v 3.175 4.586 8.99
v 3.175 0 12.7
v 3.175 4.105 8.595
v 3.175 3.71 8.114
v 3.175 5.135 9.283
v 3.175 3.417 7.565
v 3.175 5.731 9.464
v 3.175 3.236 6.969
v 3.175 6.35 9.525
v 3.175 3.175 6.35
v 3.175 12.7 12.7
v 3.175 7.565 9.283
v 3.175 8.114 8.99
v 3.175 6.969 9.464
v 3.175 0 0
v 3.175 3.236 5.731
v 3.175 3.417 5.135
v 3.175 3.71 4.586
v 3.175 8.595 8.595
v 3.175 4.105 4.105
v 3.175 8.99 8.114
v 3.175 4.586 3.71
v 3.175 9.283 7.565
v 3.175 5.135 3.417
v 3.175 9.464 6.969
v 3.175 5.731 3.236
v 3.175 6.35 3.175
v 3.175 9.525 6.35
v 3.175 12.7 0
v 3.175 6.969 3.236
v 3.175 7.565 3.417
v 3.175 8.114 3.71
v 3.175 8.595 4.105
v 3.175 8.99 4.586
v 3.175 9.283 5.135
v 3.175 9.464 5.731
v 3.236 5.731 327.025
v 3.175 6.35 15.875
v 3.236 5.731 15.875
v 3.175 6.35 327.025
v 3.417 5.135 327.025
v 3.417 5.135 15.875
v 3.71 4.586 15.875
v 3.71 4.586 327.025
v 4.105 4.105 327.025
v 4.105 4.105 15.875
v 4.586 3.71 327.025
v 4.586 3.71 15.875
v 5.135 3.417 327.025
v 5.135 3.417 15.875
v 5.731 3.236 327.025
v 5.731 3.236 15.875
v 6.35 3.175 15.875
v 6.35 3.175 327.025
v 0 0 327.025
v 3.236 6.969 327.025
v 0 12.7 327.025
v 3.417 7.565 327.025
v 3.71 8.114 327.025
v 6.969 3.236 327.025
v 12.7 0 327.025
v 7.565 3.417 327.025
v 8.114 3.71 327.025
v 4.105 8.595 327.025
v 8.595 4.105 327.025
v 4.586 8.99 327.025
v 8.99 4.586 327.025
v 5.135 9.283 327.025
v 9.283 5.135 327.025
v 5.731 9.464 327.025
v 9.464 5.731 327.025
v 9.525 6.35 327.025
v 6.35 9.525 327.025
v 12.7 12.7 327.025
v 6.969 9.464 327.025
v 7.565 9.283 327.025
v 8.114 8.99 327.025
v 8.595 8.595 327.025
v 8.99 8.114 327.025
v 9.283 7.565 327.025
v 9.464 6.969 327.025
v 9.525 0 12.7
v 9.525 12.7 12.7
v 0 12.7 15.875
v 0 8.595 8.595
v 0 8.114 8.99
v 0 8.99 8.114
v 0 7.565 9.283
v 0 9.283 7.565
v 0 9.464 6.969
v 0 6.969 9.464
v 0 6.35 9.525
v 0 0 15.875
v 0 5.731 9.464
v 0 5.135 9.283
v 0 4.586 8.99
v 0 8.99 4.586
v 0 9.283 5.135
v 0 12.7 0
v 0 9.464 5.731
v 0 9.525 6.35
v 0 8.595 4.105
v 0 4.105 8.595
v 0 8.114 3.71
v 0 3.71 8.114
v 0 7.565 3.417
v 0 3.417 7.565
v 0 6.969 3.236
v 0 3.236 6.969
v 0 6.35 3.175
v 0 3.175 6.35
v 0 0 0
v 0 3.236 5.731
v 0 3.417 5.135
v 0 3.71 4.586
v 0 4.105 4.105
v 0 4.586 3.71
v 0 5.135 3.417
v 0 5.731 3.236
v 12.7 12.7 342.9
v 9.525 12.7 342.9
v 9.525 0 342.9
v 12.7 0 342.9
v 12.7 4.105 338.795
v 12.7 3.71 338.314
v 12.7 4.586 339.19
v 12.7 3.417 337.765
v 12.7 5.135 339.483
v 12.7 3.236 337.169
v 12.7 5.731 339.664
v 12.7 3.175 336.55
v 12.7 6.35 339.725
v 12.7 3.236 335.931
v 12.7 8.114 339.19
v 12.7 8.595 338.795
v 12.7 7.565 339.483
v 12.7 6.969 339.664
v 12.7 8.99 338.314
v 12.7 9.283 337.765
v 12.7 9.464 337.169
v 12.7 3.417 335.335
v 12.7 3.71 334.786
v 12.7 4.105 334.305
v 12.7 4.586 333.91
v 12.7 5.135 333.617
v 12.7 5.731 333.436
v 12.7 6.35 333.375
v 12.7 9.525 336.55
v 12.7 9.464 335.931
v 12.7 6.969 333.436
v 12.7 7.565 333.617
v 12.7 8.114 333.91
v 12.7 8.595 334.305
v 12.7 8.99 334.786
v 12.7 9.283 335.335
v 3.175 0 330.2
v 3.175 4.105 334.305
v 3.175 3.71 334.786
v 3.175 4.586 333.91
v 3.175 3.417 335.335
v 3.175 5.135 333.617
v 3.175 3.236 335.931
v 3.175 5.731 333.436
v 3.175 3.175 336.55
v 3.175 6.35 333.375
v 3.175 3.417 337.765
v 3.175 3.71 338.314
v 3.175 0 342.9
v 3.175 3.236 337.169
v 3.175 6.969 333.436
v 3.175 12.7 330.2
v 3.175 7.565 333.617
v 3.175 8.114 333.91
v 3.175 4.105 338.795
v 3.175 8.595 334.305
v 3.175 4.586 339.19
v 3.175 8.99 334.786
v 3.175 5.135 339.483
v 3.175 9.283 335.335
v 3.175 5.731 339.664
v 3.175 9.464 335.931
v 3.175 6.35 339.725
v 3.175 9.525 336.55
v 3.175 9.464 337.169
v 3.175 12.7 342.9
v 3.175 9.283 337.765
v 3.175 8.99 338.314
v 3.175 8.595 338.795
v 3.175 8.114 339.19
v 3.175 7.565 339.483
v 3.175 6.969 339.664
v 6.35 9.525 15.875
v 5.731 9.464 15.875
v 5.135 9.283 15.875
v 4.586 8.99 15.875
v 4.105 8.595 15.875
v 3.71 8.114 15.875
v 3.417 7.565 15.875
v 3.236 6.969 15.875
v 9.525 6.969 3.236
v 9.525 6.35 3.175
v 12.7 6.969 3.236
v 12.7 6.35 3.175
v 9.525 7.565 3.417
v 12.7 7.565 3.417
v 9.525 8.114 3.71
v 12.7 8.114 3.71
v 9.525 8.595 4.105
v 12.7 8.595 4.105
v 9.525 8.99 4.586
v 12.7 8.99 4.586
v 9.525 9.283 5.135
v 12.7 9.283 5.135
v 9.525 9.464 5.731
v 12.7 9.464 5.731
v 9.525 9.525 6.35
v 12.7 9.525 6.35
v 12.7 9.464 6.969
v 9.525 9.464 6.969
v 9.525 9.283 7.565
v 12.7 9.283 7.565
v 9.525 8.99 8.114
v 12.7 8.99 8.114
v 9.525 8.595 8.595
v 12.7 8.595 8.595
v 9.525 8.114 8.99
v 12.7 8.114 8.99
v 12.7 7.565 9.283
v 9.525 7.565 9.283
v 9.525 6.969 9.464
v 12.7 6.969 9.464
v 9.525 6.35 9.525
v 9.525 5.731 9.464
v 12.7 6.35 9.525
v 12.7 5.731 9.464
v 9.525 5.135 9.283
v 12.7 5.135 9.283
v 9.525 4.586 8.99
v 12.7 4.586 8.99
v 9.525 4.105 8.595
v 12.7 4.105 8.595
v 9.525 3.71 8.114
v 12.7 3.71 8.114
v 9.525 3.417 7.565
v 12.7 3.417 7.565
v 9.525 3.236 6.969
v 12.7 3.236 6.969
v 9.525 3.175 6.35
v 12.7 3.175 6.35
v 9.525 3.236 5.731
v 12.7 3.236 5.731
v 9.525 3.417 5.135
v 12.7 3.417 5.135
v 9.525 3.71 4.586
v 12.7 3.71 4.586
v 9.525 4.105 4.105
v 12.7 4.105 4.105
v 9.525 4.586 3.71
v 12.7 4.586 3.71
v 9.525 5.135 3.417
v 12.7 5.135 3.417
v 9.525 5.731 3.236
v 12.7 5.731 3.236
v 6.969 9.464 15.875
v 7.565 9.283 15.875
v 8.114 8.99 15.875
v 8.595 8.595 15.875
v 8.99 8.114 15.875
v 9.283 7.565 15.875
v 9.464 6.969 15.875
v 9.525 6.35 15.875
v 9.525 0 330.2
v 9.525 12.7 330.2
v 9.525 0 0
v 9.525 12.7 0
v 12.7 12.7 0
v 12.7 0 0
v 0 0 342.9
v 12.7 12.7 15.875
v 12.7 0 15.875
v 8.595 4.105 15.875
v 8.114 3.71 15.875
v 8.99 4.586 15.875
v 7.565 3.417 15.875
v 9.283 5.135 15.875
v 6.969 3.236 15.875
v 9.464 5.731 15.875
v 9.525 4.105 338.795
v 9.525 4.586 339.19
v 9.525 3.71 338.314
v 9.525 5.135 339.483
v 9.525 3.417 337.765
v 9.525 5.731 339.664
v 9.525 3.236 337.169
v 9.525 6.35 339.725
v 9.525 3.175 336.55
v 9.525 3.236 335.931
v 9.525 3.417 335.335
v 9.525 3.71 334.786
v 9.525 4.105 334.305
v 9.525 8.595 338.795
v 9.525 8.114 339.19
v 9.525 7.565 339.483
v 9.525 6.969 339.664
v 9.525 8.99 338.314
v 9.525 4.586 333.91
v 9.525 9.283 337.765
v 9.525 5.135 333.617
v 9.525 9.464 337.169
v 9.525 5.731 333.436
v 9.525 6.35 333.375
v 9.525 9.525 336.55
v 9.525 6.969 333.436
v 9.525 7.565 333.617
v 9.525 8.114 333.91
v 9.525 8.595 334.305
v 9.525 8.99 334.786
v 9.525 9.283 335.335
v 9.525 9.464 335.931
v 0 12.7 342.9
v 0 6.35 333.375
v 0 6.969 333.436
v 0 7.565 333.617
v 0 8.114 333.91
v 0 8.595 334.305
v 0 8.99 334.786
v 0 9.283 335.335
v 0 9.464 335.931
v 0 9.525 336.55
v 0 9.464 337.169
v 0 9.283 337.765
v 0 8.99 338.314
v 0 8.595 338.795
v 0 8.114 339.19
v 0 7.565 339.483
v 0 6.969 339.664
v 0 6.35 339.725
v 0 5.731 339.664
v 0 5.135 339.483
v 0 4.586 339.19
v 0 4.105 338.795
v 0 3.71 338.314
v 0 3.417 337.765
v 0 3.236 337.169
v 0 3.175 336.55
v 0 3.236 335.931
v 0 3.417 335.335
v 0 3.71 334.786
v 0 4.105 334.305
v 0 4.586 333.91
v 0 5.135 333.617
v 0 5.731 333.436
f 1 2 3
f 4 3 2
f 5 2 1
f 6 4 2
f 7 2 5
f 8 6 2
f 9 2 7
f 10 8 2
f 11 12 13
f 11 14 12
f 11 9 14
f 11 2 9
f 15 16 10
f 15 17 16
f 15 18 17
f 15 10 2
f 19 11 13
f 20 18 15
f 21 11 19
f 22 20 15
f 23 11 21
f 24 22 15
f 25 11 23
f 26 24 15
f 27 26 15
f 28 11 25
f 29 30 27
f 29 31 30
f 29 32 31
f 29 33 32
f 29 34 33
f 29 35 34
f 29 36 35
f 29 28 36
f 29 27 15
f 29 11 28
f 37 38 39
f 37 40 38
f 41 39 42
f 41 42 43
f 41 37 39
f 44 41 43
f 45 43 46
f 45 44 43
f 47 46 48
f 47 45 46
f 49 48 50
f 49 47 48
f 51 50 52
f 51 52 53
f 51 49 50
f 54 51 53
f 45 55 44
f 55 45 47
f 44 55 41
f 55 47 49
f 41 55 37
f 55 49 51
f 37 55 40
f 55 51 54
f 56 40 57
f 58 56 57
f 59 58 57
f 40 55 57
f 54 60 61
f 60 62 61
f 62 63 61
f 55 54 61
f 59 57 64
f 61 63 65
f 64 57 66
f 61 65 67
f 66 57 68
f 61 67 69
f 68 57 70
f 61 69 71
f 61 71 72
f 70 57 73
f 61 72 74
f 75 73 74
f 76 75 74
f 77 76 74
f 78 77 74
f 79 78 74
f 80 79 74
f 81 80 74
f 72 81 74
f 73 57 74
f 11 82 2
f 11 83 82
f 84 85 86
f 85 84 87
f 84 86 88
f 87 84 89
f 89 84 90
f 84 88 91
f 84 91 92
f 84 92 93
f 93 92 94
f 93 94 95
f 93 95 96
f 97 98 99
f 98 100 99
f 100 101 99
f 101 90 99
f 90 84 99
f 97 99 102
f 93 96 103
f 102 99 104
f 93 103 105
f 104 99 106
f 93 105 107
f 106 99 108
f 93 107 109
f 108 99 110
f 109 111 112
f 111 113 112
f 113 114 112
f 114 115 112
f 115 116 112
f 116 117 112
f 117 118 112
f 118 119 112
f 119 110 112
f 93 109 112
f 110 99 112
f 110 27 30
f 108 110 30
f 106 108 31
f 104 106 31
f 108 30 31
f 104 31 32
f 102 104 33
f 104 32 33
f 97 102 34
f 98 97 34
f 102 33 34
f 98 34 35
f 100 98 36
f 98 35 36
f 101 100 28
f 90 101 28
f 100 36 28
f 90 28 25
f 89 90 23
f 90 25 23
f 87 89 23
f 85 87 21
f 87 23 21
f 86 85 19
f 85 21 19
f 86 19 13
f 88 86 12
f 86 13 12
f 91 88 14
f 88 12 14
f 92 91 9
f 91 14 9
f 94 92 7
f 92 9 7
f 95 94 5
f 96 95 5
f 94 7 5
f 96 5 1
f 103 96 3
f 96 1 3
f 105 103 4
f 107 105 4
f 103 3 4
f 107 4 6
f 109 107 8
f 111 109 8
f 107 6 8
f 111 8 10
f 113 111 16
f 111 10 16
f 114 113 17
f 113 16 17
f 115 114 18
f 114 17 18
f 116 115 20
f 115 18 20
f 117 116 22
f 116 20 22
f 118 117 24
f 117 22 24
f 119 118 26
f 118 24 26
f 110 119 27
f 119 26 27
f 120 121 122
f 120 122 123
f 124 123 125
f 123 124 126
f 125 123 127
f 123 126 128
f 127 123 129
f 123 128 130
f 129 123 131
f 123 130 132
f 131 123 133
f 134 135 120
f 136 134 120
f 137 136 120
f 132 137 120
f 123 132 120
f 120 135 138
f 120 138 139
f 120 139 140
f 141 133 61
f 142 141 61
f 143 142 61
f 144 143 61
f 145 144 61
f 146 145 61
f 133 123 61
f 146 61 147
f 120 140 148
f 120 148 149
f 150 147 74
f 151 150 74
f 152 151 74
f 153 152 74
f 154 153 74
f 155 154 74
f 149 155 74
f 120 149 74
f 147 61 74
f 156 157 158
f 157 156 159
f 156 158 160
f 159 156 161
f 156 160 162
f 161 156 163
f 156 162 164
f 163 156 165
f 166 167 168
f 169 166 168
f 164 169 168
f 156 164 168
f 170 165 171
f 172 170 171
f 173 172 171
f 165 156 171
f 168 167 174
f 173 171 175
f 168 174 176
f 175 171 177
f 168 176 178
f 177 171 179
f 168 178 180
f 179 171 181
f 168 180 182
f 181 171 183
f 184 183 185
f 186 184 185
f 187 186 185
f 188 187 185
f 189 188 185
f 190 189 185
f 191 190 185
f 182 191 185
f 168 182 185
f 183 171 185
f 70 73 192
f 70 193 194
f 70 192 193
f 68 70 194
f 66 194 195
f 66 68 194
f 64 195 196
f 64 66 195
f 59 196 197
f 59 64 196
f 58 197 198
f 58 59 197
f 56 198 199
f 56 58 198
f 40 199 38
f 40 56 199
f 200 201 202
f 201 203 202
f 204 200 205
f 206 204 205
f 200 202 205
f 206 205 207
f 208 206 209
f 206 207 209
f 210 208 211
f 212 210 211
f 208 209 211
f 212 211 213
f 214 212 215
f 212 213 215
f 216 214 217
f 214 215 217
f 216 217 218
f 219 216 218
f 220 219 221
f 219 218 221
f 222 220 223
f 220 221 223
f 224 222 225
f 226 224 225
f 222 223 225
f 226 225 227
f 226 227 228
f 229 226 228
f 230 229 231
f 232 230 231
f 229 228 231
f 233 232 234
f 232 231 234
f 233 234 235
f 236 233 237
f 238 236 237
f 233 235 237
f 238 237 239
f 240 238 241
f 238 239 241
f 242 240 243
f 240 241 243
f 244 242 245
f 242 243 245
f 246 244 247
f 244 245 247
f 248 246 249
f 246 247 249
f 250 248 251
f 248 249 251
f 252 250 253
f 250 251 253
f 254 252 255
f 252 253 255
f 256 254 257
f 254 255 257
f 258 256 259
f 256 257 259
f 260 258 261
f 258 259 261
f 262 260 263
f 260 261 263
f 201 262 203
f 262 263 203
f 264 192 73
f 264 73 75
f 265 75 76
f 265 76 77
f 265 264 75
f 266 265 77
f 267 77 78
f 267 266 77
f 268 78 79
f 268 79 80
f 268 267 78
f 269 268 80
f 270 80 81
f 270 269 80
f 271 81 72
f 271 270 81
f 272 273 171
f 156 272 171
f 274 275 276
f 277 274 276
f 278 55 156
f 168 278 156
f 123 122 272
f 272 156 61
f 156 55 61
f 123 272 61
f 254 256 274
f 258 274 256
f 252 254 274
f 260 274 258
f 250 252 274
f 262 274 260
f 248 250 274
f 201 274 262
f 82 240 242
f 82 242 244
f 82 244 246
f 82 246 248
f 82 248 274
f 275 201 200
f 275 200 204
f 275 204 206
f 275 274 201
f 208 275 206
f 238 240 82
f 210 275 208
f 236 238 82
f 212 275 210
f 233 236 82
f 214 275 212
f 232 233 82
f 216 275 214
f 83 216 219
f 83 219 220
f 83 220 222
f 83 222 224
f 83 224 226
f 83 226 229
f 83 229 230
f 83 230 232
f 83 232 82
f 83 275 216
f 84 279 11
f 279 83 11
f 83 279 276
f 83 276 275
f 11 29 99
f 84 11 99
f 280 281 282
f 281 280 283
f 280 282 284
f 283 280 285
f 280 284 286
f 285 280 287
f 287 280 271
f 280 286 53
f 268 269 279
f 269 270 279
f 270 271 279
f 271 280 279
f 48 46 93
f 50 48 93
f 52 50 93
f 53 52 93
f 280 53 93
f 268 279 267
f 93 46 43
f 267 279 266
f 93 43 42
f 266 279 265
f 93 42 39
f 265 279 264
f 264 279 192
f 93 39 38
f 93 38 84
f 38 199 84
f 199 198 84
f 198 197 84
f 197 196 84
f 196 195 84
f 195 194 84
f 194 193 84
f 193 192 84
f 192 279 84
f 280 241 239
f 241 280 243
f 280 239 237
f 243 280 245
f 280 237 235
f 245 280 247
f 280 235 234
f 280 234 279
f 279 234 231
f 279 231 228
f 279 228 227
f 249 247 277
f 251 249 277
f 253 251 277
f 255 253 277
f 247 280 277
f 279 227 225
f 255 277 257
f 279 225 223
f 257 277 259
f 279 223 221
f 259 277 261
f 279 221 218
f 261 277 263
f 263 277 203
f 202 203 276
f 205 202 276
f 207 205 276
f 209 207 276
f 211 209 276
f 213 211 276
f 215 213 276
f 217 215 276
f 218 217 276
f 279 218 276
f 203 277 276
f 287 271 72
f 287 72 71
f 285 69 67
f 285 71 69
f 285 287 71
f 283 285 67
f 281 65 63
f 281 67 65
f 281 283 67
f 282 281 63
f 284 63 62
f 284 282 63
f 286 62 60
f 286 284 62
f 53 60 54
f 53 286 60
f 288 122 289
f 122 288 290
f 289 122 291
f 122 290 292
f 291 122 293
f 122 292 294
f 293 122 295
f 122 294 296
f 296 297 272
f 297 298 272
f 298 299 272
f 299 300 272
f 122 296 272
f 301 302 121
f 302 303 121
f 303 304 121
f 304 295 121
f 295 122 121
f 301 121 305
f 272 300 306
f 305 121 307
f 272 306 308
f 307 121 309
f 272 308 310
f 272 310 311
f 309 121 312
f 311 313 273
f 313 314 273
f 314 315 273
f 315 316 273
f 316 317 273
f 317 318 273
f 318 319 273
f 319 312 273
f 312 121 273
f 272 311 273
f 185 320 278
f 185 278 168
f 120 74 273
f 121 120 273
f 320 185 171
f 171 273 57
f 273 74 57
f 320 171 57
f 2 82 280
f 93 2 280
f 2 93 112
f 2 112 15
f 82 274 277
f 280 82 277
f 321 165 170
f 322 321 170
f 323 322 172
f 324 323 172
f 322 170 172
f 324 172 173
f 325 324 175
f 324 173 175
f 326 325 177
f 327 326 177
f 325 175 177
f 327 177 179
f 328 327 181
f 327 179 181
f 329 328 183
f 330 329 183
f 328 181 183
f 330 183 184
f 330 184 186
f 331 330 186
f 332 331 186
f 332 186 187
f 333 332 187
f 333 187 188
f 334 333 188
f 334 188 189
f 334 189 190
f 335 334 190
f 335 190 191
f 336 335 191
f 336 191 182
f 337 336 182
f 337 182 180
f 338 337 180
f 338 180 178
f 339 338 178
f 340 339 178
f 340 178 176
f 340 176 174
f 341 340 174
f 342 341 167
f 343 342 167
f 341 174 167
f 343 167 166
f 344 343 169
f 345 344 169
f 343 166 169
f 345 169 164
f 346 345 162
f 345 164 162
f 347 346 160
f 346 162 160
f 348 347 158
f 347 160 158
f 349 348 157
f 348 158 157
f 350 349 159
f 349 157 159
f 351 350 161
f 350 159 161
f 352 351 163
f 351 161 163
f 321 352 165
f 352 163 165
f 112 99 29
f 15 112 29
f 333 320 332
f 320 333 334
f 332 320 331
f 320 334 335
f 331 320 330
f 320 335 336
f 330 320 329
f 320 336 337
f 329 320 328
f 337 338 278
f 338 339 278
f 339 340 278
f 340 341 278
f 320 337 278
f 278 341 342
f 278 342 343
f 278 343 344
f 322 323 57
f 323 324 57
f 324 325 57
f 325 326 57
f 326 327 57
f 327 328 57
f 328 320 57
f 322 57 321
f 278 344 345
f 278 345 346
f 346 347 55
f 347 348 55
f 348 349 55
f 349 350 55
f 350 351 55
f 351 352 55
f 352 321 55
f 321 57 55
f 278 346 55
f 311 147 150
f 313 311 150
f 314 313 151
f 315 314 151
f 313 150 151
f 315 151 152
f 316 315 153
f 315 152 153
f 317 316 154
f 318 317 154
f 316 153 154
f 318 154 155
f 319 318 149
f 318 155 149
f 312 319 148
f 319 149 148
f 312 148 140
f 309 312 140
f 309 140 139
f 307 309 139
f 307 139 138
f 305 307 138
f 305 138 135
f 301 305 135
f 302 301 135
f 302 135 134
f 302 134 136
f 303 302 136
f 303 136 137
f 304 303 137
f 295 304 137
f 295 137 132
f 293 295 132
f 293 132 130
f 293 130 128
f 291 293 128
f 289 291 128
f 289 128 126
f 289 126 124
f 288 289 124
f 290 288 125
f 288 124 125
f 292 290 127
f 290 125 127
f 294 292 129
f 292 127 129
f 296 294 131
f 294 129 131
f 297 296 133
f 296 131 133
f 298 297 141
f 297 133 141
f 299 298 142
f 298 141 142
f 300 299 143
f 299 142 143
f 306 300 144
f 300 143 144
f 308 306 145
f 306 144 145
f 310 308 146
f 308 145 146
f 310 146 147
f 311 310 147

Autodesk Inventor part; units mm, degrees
ref_plane "YZ Plane" through (0, 0, 0) normal (1, 0, 0) x (0, 1, 0)
ref_plane "XZ Plane" through (0, 0, 0) normal (0, 1, 0) x (-1, 0, 0)
ref_plane "XY Plane" through (0, 0, 0) normal (0, 0, 1) x (1, 0, 0)
sketch "Sketch1" plane through (0, 0, 0) normal (0, 0, 1) x (1, 0, 0)
  line L0 (0, 0) -> (12.7, 0)
  line L1 (12.7, 0) -> (12.7, 12.7)
  line L2 (12.7, 12.7) -> (0, 12.7)
  line L3 (0, 12.7) -> (0, 0)
  dimension "d0" = 12.7
  dimension "d1" = 12.7
extrude "Extrusion1" add sketch "Sketch1" along normal blind 342.9
sketch "Sketch2" plane through (12.7, 12.7, 342.9) normal (0, 1, 0) x (1, 0, 0)
  line L0 (-12.7, 0) -> (0, 0) projected
  line L1 (0, 342.9) -> (0, 0) projected
  line L2 (0, 342.9) -> (-12.7, 342.9) projected
  line L3 (-12.7, 342.9) -> (-12.7, 0) projected
  line L4 (-12.7, 15.875) -> (-9.525, 15.875)
  line L5 (-9.525, 15.875) -> (-9.525, 327.025)
  line L6 (-9.525, 327.025) -> (-12.7, 327.025)
  line L7 (-12.7, 327.025) -> (-12.7, 15.875)
  line L8 (0, 327.025) -> (-3.175, 327.025)
  line L9 (-3.175, 327.025) -> (-3.175, 15.875)
  line L10 (-3.175, 15.875) -> (0, 15.875)
  line L11 (0, 15.875) -> (0, 327.025)
  line L12 (-9.525, 342.9) -> (-3.175, 342.9)
  line L13 (-3.175, 342.9) -> (-3.175, 330.2)
  line L14 (-3.175, 330.2) -> (-9.525, 330.2)
  line L15 (-9.525, 330.2) -> (-9.525, 342.9)
  line L16 (-9.525, 0) -> (-3.175, 0)
  line L17 (-3.175, 0) -> (-3.175, 12.7)
  line L18 (-3.175, 12.7) -> (-9.525, 12.7)
  line L19 (-9.525, 12.7) -> (-9.525, 0)
  dimension "d4" = 15.875
  dimension "d5" = 6.35
  dimension "d6" = 15.875
  dimension "d7" = 12.7
  dimension "d8" = 12.7
extrude "Extrusion2" cut sketch "Sketch2" against normal through all contours L19 L18 L17 L0 | L3 L6 L5 L4 | L10 L9 L8 L1 | L2 L13 L14 L15
sketch "Sketch3" plane through (12.7, 0, 342.9) normal (1, 0, 0) x (0, 0, -1)
  line L0 (15.875, 12.7) -> (0, 12.7) projected
  line L1 (0, 12.7) -> (0, 0) projected
  line L2 (327.025, 12.7) -> (327.025, 0) projected
  line L3 (342.9, 0) -> (327.025, 0) projected
  line L4 (342.9, 0) -> (342.9, 12.7) projected
  line L5 (342.9, 12.7) -> (327.025, 12.7) projected
  line L6 (327.025, 0) -> (15.875, 0) projected
  line L7 (327.025, 12.7) -> (327.025, 0) projected
  line L8 (15.875, 12.7) -> (327.025, 12.7) projected
  line L9 (15.875, 12.7) -> (15.875, 0) projected
  line L10 (15.875, 12.7) -> (327.025, 12.7)
  line L11 (327.025, 12.7) -> (327.025, 9.525)
  line L12 (327.025, 9.525) -> (15.875, 9.525)
  line L13 (15.875, 9.525) -> (15.875, 12.7)
  line L14 (327.025, 3.175) -> (15.875, 3.175)
  line L15 (15.875, 3.175) -> (15.875, 0)
  line L16 (15.875, 0) -> (327.025, 0)
  line L17 (327.025, 0) -> (327.025, 3.175)
  circle A0 centre (6.35, 6.35) radius 3.175
  circle A1 centre (336.55, 6.35) radius 3.175
  point P0 (342.9, 0)
  dimension "d11" = 6.35
  dimension "d12" = 6.35
  dimension "d13" = 6.35
  dimension "d14" = 6.35
  dimension "d15" = 3.175
  dimension "d16" = 6.35
  dimension "d17" = 6.35
  dimension "d18" = 6.35
extrude "Extrusion3" cut sketch "Sketch3" against normal through all contours L2 L12 L9 L8 | L2 L6 L9 L14 | A0 | A1
fillet "Fillet1" radius 3.175 4 edges at (9.525, 9.525, 171.45) (3.175, 9.525, 171.45) (3.175, 3.175, 171.45) (9.525, 3.175, 171.45)
equation "\"d1\" = d0"
equation "\"d13\" = d12"
equation "\"d17\" = d16"
equation "\"d18\" = d17"
properties part number "8 ball manipulator piston"
